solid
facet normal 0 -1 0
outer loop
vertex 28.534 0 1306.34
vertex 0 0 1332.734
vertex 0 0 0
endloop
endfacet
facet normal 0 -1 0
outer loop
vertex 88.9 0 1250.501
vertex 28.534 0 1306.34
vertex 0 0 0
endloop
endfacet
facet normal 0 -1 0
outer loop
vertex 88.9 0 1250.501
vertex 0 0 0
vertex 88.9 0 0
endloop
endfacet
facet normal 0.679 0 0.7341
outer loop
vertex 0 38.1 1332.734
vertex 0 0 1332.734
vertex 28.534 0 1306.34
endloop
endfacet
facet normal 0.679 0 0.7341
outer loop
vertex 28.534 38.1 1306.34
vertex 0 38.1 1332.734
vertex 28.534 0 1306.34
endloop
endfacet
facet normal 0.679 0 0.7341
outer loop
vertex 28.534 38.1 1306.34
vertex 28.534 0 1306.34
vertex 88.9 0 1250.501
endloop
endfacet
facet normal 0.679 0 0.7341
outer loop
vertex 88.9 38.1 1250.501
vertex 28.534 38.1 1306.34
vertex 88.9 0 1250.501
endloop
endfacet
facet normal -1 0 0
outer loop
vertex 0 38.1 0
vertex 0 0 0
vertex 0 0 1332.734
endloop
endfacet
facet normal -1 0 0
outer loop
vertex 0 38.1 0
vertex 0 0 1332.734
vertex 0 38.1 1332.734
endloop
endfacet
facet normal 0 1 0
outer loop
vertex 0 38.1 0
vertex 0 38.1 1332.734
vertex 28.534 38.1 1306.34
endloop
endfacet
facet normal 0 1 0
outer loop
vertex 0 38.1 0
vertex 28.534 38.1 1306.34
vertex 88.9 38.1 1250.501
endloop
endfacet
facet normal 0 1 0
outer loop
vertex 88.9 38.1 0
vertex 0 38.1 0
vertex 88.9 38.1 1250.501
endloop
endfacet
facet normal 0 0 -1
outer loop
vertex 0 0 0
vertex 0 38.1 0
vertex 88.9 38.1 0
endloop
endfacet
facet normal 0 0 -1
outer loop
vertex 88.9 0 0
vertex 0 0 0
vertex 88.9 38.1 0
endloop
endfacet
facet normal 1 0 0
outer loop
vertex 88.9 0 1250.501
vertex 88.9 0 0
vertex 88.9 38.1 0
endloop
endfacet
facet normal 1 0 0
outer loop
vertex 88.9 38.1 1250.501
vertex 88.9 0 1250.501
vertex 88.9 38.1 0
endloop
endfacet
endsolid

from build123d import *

# Parameters (mm, degrees)
F0_W     = 88.9
F0_H     = 38.1
F1_DEPTH = 1371.6
F3_DEPTH = 38.101


with BuildPart() as f1:
    # F0 (on Top) → F1 (new body)
    with BuildSketch(Plane.XY):
        with Locations((44.45, 19.05)):
            Rectangle(F0_W, F0_H)
    extrude(amount=F1_DEPTH)

    # F2 (on face) → F3 (cut, through all)
    with BuildSketch(Plane.XZ):
        Polygon((28.53436, 1306.33978), (88.9, 1371.6), (0, 1371.6), (0, 1332.734131), align=None)
        Polygon((88.9, 1250.501419), (88.9, 1371.6), (28.53436, 1306.33978), align=None)
    extrude(amount=-F3_DEPTH, mode=Mode.SUBTRACT)


solid = f1.part
